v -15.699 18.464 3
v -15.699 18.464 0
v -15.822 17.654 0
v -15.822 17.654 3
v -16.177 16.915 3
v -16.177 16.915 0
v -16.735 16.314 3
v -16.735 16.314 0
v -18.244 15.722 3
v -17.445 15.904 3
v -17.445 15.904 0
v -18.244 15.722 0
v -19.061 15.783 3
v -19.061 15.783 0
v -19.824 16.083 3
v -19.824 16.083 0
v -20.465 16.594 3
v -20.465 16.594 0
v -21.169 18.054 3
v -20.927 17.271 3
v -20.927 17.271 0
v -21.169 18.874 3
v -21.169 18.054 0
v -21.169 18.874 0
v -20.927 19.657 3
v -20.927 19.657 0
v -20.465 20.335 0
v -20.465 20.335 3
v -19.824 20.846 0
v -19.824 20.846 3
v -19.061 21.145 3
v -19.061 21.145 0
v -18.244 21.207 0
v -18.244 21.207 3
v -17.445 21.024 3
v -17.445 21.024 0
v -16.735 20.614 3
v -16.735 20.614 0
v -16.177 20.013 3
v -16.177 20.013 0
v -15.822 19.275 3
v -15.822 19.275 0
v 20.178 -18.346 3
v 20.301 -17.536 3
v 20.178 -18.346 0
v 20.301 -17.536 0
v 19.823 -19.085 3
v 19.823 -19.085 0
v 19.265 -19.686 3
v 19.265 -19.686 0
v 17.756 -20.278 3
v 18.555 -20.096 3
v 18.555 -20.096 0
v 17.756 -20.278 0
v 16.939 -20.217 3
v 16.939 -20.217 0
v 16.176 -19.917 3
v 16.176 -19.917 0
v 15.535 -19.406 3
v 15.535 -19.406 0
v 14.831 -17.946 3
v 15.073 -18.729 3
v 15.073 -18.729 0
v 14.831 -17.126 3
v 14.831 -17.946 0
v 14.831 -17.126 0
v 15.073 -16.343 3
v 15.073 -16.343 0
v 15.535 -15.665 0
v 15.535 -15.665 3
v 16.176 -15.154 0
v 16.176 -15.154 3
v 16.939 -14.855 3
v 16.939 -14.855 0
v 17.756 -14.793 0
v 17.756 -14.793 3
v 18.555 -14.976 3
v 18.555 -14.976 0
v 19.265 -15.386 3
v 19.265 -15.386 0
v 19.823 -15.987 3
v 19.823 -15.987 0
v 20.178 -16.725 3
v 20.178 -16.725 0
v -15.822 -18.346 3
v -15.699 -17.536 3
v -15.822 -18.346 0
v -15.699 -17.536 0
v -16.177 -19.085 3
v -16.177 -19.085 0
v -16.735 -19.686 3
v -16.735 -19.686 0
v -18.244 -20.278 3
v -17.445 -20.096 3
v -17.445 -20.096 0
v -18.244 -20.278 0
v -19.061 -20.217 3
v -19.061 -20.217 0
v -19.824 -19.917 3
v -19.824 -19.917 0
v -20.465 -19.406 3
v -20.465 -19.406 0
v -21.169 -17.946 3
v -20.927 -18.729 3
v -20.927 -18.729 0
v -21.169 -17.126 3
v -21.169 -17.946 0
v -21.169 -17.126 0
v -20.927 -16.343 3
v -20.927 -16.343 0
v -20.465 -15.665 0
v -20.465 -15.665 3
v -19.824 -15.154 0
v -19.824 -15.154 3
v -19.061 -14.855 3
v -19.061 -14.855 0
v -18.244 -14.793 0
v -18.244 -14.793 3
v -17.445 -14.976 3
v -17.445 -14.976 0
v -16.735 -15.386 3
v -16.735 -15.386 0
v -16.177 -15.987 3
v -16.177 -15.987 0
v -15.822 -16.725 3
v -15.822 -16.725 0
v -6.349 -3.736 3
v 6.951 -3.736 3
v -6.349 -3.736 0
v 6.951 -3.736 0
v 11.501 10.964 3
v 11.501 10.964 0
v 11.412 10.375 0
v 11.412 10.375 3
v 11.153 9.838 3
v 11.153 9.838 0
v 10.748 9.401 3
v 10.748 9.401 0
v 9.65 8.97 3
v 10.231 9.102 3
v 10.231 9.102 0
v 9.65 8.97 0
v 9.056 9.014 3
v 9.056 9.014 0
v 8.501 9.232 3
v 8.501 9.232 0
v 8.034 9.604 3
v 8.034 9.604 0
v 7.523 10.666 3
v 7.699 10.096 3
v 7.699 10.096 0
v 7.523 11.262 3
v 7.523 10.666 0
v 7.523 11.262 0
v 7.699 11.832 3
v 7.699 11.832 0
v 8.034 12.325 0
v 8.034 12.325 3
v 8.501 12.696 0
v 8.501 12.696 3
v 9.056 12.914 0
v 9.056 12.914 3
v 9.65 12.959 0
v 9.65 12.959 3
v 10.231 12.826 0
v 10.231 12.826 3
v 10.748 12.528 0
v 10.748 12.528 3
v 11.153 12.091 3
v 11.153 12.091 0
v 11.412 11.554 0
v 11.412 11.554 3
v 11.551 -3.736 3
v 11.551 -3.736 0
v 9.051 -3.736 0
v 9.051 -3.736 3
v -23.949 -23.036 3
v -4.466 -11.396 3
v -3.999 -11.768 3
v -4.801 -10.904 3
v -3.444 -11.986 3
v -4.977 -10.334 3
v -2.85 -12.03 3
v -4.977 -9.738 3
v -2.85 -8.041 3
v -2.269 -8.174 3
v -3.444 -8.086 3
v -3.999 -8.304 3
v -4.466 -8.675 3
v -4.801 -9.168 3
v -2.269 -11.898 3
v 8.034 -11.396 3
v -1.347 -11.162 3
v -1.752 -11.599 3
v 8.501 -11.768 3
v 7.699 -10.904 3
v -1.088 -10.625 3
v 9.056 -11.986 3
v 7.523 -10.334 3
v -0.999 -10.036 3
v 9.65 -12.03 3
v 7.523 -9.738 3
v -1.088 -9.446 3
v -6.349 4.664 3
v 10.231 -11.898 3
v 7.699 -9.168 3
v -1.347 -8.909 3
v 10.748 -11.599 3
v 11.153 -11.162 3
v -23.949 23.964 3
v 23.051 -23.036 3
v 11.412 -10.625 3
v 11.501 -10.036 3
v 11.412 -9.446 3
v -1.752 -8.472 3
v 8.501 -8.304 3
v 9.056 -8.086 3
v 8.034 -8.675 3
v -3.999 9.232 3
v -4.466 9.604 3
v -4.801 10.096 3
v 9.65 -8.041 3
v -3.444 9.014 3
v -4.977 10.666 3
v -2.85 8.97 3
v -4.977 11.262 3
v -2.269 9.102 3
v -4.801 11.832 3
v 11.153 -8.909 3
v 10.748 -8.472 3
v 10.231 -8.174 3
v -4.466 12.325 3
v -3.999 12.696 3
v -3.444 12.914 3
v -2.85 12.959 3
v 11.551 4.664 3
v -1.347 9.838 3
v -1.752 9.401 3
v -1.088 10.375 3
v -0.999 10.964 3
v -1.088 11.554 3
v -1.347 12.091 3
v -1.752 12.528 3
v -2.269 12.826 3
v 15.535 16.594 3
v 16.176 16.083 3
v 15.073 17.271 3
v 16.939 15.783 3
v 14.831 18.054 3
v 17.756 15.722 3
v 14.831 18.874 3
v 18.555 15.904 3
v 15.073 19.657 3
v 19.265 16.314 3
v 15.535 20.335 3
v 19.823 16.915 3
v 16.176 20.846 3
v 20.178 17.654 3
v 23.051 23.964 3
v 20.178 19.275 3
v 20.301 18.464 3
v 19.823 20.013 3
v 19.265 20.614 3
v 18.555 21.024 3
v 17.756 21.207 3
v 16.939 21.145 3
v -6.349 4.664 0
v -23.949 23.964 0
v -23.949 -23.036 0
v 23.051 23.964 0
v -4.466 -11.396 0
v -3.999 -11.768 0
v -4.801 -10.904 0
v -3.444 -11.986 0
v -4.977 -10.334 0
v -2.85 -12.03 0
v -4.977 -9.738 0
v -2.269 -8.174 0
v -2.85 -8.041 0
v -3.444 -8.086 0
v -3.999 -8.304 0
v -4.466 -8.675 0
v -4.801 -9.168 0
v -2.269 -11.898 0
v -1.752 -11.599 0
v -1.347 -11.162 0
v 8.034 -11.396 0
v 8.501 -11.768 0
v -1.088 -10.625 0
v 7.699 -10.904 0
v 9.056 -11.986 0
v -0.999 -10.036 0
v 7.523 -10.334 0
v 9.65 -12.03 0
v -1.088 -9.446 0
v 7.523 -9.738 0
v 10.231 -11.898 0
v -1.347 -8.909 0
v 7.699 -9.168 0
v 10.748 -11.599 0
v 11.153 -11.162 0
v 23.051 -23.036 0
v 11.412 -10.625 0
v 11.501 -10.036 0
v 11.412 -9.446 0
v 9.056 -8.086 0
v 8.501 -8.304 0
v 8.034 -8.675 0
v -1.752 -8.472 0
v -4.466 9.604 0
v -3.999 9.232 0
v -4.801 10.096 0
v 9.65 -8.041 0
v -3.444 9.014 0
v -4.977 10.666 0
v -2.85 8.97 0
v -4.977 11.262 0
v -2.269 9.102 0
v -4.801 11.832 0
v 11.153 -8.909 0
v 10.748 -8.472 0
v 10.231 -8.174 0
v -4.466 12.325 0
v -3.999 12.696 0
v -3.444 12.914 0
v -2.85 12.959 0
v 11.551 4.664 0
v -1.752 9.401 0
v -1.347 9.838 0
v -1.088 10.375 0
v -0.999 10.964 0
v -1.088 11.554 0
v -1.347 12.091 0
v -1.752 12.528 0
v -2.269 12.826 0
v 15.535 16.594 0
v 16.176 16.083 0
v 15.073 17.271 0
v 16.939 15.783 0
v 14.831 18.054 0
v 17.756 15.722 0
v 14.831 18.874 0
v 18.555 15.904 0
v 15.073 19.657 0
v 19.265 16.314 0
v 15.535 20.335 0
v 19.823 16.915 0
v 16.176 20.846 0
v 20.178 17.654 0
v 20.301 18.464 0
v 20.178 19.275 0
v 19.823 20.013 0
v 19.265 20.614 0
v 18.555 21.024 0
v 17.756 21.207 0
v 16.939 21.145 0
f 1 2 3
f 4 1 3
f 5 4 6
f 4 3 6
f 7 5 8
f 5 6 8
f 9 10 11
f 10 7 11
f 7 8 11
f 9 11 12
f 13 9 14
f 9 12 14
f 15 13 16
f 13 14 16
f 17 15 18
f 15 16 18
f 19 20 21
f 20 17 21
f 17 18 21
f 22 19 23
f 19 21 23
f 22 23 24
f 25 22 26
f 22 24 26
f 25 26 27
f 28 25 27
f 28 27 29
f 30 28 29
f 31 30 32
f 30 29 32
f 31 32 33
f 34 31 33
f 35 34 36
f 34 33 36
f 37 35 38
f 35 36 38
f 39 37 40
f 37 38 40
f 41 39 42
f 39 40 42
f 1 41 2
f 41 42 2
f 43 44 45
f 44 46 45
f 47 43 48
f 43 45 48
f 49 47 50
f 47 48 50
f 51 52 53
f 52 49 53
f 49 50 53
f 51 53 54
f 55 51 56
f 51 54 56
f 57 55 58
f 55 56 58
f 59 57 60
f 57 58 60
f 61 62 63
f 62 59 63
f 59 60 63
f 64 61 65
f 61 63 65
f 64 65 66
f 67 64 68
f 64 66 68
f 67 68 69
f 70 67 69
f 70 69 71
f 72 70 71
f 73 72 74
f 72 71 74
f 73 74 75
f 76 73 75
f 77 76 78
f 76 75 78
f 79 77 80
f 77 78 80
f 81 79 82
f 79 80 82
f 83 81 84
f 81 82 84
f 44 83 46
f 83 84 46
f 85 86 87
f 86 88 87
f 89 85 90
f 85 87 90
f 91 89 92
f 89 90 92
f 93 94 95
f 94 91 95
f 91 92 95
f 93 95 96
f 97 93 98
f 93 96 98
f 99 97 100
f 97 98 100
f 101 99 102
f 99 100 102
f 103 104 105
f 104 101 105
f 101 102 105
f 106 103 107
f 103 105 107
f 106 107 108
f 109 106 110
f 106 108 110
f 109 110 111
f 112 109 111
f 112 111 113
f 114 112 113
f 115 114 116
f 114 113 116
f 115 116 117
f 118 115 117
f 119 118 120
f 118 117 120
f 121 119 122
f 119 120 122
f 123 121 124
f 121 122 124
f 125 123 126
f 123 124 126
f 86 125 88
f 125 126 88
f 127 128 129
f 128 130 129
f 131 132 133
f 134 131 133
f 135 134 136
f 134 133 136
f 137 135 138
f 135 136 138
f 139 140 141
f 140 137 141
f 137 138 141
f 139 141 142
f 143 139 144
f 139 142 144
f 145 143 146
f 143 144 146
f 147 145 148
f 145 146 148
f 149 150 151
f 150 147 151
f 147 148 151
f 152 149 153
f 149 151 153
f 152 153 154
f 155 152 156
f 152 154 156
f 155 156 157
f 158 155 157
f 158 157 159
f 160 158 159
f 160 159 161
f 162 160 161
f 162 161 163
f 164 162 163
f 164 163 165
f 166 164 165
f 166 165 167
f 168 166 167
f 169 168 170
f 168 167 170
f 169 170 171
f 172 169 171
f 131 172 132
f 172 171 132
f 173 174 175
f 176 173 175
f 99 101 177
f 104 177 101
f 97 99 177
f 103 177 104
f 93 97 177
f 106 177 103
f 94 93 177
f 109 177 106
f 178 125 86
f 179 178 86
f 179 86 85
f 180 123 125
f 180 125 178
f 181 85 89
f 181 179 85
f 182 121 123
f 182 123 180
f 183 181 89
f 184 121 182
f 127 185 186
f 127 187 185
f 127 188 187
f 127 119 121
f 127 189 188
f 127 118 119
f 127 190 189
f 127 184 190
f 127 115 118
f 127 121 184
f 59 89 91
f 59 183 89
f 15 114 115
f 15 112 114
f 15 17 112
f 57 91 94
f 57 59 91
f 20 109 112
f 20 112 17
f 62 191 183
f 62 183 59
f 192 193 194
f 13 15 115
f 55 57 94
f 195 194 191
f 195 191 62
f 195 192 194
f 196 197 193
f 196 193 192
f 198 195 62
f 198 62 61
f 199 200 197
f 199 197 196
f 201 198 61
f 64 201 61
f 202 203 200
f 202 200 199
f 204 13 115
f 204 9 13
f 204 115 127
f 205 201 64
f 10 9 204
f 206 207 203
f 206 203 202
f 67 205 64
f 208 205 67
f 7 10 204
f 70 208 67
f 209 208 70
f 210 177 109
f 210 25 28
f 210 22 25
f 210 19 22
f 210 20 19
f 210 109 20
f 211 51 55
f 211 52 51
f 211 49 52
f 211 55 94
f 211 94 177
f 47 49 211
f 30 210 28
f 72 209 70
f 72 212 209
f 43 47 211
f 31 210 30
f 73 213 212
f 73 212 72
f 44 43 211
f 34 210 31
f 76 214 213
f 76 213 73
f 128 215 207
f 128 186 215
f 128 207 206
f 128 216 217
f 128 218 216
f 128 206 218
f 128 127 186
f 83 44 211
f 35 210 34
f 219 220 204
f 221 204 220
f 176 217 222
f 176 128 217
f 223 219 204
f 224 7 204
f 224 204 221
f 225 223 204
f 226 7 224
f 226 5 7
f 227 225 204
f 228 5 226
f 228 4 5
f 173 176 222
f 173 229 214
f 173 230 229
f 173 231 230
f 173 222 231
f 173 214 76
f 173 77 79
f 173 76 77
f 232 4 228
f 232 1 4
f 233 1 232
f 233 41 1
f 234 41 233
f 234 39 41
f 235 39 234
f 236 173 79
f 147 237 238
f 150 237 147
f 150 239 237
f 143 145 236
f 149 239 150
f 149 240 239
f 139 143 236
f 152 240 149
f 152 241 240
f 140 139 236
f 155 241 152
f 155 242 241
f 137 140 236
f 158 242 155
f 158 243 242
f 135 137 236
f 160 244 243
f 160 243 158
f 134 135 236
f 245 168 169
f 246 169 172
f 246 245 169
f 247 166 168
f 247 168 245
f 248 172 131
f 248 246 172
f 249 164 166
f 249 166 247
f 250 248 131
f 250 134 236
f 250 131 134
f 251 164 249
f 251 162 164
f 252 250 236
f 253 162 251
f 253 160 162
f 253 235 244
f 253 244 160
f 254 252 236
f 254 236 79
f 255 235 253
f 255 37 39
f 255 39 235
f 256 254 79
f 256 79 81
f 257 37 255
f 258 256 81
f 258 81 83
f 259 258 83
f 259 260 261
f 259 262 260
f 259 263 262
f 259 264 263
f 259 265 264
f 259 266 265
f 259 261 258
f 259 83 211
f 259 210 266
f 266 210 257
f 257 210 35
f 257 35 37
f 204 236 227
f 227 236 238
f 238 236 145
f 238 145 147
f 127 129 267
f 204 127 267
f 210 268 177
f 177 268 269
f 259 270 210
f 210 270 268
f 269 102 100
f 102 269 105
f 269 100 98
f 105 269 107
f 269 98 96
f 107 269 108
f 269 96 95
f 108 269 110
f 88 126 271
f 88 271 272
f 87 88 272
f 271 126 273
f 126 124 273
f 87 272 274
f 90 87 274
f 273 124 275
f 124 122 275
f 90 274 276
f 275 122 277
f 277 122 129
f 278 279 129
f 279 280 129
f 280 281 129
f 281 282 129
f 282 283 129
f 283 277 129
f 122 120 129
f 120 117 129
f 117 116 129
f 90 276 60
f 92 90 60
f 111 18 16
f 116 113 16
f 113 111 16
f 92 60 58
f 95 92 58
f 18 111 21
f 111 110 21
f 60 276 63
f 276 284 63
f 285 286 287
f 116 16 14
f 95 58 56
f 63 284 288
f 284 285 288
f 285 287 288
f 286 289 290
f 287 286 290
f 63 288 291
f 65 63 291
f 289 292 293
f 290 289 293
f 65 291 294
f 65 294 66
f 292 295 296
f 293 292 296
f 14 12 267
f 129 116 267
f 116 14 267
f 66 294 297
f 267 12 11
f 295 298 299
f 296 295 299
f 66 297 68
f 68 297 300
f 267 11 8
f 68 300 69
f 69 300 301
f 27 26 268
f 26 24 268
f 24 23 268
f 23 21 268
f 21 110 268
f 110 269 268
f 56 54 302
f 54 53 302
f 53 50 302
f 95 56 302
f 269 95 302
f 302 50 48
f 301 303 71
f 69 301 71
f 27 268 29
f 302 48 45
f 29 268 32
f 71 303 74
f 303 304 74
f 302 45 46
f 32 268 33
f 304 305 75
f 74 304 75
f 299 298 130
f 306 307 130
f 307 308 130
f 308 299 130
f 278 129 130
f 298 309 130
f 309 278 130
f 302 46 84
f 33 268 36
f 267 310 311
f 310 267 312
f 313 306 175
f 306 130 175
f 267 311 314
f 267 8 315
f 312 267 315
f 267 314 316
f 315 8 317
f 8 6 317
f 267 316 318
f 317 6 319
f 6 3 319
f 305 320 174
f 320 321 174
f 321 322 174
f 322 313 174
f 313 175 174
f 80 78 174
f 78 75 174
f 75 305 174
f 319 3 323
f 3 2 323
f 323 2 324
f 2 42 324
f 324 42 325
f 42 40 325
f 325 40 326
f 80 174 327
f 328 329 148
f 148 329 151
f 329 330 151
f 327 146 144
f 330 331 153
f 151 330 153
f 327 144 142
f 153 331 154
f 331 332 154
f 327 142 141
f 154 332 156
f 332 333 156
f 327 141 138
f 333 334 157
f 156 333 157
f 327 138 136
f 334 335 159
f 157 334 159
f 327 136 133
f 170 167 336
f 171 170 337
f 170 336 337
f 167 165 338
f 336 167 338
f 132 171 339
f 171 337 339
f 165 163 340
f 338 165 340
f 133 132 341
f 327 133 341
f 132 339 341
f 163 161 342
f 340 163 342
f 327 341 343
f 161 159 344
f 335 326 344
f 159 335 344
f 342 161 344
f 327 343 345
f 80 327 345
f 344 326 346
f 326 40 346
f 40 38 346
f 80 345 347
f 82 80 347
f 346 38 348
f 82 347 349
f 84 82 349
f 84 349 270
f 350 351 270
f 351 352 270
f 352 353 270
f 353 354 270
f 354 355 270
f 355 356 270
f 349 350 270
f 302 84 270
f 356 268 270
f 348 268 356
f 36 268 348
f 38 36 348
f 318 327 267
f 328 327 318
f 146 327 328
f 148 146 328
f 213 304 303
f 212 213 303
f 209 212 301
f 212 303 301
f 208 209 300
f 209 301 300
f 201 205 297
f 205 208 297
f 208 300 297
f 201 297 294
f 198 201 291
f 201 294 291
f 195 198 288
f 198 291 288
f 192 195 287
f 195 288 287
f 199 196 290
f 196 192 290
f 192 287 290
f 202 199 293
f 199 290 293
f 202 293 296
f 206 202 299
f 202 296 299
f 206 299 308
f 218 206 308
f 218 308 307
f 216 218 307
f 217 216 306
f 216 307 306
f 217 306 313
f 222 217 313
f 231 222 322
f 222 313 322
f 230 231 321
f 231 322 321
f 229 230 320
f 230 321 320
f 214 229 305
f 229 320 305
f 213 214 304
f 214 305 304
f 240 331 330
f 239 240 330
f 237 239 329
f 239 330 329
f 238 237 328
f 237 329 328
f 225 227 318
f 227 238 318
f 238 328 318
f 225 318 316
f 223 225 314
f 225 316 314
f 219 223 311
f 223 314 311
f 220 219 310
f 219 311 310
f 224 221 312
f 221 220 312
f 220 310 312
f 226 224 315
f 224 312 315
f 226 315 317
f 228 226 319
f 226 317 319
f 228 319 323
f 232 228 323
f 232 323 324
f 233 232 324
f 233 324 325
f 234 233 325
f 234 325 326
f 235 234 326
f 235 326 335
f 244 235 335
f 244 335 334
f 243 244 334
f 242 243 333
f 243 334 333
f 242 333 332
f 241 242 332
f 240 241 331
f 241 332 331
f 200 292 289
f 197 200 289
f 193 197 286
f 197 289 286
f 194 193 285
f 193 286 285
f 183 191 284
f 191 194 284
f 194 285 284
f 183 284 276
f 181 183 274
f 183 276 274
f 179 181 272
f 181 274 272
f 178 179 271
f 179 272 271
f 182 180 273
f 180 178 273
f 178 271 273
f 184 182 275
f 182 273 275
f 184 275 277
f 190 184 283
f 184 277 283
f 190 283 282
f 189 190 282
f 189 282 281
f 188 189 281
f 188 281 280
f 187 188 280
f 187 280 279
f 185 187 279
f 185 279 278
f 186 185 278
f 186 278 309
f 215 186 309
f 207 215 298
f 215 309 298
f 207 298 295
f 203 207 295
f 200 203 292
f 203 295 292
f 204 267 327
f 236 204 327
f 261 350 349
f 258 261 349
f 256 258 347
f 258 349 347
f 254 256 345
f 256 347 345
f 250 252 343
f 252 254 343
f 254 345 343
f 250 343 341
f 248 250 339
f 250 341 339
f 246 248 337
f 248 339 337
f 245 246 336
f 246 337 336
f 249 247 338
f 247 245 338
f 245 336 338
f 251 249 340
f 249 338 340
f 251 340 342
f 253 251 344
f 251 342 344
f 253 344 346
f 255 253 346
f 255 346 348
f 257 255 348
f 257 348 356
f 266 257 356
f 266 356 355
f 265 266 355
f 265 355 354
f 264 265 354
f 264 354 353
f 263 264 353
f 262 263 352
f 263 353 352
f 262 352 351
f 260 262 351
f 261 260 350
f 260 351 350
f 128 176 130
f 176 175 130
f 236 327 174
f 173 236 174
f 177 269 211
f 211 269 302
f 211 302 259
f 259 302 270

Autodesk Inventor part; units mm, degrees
ref_plane "YZ Plane" through (0, 0, 0) normal (1, 0, 0) x (0, 1, 0)
ref_plane "XZ Plane" through (0, 0, 0) normal (0, 1, 0) x (-1, 0, 0)
ref_plane "XY Plane" through (0, 0, 0) normal (0, 0, 1) x (1, 0, 0)
sketch "Sketch1" plane through (0, 0, 0) normal (0, 0, 1) x (1, 0, 0)
  circle A0 centre (9.5006, -10.0358) radius 2
  circle A1 centre (-2.9994, -10.0358) radius 2
  circle A2 centre (-2.9994, 10.9642) radius 2
  circle A3 centre (9.5006, 10.9642) radius 2
  line L0 (9.0506, -3.7358) -> (6.9506, -3.7358)
  line L1 (6.9506, -3.7358) -> (-6.3494, -3.7358)
  line L2 (-6.3494, -3.7358) -> (-6.3494, 4.6642)
  line L3 (-6.3494, 4.6642) -> (11.5506, 4.6642)
  line L4 (11.5506, 4.6642) -> (11.5506, -3.7358)
  line L5 (11.5506, -3.7358) -> (9.0506, -3.7358)
  line L6 (9.0506, -3.7358) -> (9.0506, -8.5358) construction
  line L7 (9.0506, -8.5358) -> (6.9506, -8.5358) construction
  line L8 (6.9506, -8.5358) -> (6.9506, -3.7358) construction
  line L9 (-23.9494, 23.9642) -> (-23.9494, -23.0358)
  circle A4 centre (-18.4494, -17.5358) radius 1.4 construction
  circle A5 centre (-18.4494, 18.4642) radius 1.4 construction
  circle A6 centre (17.5506, 18.4642) radius 1.4 construction
  circle A7 centre (17.5506, -17.5358) radius 1.4 construction
  circle A8 centre (-18.4494, -17.5358) radius 1.4 construction
  circle A9 centre (17.5506, -17.5358) radius 1.4 construction
  circle A10 centre (17.5506, 18.4642) radius 1.4 construction
  circle A11 centre (-18.4494, 18.4642) radius 1.4 construction
  circle A12 centre (-2.9994, 10.9642) radius 0.9
  circle A13 centre (9.5006, 10.9642) radius 0.9
  circle A14 centre (9.5006, -10.0358) radius 0.9
  circle A15 centre (-2.9994, -10.0358) radius 0.9
  line L10 (-23.9494, -23.0358) -> (23.0506, -23.0358)
  line L11 (23.0506, -23.0358) -> (23.0506, 23.9642)
  line L12 (23.0506, 23.9642) -> (-23.9494, 23.9642)
  line L13 (10.4426, -23.0358) -> (10.4426, 23.9642) construction
  line L14 (-22.2241, 23.9642) -> (-22.2241, -23.0358) construction
  circle A16 centre (17.5506, -17.5358) radius 2.75
  circle A17 centre (-18.4494, -17.5358) radius 2.75
  circle A18 centre (17.5506, 18.4642) radius 2.75
  circle A19 centre (-18.4494, 18.4642) radius 2.75
  point P0 (0, 0)
extrude "Extrusion1" add sketch "Sketch1" along normal blind 3 contours L12 L11 L10 L9
